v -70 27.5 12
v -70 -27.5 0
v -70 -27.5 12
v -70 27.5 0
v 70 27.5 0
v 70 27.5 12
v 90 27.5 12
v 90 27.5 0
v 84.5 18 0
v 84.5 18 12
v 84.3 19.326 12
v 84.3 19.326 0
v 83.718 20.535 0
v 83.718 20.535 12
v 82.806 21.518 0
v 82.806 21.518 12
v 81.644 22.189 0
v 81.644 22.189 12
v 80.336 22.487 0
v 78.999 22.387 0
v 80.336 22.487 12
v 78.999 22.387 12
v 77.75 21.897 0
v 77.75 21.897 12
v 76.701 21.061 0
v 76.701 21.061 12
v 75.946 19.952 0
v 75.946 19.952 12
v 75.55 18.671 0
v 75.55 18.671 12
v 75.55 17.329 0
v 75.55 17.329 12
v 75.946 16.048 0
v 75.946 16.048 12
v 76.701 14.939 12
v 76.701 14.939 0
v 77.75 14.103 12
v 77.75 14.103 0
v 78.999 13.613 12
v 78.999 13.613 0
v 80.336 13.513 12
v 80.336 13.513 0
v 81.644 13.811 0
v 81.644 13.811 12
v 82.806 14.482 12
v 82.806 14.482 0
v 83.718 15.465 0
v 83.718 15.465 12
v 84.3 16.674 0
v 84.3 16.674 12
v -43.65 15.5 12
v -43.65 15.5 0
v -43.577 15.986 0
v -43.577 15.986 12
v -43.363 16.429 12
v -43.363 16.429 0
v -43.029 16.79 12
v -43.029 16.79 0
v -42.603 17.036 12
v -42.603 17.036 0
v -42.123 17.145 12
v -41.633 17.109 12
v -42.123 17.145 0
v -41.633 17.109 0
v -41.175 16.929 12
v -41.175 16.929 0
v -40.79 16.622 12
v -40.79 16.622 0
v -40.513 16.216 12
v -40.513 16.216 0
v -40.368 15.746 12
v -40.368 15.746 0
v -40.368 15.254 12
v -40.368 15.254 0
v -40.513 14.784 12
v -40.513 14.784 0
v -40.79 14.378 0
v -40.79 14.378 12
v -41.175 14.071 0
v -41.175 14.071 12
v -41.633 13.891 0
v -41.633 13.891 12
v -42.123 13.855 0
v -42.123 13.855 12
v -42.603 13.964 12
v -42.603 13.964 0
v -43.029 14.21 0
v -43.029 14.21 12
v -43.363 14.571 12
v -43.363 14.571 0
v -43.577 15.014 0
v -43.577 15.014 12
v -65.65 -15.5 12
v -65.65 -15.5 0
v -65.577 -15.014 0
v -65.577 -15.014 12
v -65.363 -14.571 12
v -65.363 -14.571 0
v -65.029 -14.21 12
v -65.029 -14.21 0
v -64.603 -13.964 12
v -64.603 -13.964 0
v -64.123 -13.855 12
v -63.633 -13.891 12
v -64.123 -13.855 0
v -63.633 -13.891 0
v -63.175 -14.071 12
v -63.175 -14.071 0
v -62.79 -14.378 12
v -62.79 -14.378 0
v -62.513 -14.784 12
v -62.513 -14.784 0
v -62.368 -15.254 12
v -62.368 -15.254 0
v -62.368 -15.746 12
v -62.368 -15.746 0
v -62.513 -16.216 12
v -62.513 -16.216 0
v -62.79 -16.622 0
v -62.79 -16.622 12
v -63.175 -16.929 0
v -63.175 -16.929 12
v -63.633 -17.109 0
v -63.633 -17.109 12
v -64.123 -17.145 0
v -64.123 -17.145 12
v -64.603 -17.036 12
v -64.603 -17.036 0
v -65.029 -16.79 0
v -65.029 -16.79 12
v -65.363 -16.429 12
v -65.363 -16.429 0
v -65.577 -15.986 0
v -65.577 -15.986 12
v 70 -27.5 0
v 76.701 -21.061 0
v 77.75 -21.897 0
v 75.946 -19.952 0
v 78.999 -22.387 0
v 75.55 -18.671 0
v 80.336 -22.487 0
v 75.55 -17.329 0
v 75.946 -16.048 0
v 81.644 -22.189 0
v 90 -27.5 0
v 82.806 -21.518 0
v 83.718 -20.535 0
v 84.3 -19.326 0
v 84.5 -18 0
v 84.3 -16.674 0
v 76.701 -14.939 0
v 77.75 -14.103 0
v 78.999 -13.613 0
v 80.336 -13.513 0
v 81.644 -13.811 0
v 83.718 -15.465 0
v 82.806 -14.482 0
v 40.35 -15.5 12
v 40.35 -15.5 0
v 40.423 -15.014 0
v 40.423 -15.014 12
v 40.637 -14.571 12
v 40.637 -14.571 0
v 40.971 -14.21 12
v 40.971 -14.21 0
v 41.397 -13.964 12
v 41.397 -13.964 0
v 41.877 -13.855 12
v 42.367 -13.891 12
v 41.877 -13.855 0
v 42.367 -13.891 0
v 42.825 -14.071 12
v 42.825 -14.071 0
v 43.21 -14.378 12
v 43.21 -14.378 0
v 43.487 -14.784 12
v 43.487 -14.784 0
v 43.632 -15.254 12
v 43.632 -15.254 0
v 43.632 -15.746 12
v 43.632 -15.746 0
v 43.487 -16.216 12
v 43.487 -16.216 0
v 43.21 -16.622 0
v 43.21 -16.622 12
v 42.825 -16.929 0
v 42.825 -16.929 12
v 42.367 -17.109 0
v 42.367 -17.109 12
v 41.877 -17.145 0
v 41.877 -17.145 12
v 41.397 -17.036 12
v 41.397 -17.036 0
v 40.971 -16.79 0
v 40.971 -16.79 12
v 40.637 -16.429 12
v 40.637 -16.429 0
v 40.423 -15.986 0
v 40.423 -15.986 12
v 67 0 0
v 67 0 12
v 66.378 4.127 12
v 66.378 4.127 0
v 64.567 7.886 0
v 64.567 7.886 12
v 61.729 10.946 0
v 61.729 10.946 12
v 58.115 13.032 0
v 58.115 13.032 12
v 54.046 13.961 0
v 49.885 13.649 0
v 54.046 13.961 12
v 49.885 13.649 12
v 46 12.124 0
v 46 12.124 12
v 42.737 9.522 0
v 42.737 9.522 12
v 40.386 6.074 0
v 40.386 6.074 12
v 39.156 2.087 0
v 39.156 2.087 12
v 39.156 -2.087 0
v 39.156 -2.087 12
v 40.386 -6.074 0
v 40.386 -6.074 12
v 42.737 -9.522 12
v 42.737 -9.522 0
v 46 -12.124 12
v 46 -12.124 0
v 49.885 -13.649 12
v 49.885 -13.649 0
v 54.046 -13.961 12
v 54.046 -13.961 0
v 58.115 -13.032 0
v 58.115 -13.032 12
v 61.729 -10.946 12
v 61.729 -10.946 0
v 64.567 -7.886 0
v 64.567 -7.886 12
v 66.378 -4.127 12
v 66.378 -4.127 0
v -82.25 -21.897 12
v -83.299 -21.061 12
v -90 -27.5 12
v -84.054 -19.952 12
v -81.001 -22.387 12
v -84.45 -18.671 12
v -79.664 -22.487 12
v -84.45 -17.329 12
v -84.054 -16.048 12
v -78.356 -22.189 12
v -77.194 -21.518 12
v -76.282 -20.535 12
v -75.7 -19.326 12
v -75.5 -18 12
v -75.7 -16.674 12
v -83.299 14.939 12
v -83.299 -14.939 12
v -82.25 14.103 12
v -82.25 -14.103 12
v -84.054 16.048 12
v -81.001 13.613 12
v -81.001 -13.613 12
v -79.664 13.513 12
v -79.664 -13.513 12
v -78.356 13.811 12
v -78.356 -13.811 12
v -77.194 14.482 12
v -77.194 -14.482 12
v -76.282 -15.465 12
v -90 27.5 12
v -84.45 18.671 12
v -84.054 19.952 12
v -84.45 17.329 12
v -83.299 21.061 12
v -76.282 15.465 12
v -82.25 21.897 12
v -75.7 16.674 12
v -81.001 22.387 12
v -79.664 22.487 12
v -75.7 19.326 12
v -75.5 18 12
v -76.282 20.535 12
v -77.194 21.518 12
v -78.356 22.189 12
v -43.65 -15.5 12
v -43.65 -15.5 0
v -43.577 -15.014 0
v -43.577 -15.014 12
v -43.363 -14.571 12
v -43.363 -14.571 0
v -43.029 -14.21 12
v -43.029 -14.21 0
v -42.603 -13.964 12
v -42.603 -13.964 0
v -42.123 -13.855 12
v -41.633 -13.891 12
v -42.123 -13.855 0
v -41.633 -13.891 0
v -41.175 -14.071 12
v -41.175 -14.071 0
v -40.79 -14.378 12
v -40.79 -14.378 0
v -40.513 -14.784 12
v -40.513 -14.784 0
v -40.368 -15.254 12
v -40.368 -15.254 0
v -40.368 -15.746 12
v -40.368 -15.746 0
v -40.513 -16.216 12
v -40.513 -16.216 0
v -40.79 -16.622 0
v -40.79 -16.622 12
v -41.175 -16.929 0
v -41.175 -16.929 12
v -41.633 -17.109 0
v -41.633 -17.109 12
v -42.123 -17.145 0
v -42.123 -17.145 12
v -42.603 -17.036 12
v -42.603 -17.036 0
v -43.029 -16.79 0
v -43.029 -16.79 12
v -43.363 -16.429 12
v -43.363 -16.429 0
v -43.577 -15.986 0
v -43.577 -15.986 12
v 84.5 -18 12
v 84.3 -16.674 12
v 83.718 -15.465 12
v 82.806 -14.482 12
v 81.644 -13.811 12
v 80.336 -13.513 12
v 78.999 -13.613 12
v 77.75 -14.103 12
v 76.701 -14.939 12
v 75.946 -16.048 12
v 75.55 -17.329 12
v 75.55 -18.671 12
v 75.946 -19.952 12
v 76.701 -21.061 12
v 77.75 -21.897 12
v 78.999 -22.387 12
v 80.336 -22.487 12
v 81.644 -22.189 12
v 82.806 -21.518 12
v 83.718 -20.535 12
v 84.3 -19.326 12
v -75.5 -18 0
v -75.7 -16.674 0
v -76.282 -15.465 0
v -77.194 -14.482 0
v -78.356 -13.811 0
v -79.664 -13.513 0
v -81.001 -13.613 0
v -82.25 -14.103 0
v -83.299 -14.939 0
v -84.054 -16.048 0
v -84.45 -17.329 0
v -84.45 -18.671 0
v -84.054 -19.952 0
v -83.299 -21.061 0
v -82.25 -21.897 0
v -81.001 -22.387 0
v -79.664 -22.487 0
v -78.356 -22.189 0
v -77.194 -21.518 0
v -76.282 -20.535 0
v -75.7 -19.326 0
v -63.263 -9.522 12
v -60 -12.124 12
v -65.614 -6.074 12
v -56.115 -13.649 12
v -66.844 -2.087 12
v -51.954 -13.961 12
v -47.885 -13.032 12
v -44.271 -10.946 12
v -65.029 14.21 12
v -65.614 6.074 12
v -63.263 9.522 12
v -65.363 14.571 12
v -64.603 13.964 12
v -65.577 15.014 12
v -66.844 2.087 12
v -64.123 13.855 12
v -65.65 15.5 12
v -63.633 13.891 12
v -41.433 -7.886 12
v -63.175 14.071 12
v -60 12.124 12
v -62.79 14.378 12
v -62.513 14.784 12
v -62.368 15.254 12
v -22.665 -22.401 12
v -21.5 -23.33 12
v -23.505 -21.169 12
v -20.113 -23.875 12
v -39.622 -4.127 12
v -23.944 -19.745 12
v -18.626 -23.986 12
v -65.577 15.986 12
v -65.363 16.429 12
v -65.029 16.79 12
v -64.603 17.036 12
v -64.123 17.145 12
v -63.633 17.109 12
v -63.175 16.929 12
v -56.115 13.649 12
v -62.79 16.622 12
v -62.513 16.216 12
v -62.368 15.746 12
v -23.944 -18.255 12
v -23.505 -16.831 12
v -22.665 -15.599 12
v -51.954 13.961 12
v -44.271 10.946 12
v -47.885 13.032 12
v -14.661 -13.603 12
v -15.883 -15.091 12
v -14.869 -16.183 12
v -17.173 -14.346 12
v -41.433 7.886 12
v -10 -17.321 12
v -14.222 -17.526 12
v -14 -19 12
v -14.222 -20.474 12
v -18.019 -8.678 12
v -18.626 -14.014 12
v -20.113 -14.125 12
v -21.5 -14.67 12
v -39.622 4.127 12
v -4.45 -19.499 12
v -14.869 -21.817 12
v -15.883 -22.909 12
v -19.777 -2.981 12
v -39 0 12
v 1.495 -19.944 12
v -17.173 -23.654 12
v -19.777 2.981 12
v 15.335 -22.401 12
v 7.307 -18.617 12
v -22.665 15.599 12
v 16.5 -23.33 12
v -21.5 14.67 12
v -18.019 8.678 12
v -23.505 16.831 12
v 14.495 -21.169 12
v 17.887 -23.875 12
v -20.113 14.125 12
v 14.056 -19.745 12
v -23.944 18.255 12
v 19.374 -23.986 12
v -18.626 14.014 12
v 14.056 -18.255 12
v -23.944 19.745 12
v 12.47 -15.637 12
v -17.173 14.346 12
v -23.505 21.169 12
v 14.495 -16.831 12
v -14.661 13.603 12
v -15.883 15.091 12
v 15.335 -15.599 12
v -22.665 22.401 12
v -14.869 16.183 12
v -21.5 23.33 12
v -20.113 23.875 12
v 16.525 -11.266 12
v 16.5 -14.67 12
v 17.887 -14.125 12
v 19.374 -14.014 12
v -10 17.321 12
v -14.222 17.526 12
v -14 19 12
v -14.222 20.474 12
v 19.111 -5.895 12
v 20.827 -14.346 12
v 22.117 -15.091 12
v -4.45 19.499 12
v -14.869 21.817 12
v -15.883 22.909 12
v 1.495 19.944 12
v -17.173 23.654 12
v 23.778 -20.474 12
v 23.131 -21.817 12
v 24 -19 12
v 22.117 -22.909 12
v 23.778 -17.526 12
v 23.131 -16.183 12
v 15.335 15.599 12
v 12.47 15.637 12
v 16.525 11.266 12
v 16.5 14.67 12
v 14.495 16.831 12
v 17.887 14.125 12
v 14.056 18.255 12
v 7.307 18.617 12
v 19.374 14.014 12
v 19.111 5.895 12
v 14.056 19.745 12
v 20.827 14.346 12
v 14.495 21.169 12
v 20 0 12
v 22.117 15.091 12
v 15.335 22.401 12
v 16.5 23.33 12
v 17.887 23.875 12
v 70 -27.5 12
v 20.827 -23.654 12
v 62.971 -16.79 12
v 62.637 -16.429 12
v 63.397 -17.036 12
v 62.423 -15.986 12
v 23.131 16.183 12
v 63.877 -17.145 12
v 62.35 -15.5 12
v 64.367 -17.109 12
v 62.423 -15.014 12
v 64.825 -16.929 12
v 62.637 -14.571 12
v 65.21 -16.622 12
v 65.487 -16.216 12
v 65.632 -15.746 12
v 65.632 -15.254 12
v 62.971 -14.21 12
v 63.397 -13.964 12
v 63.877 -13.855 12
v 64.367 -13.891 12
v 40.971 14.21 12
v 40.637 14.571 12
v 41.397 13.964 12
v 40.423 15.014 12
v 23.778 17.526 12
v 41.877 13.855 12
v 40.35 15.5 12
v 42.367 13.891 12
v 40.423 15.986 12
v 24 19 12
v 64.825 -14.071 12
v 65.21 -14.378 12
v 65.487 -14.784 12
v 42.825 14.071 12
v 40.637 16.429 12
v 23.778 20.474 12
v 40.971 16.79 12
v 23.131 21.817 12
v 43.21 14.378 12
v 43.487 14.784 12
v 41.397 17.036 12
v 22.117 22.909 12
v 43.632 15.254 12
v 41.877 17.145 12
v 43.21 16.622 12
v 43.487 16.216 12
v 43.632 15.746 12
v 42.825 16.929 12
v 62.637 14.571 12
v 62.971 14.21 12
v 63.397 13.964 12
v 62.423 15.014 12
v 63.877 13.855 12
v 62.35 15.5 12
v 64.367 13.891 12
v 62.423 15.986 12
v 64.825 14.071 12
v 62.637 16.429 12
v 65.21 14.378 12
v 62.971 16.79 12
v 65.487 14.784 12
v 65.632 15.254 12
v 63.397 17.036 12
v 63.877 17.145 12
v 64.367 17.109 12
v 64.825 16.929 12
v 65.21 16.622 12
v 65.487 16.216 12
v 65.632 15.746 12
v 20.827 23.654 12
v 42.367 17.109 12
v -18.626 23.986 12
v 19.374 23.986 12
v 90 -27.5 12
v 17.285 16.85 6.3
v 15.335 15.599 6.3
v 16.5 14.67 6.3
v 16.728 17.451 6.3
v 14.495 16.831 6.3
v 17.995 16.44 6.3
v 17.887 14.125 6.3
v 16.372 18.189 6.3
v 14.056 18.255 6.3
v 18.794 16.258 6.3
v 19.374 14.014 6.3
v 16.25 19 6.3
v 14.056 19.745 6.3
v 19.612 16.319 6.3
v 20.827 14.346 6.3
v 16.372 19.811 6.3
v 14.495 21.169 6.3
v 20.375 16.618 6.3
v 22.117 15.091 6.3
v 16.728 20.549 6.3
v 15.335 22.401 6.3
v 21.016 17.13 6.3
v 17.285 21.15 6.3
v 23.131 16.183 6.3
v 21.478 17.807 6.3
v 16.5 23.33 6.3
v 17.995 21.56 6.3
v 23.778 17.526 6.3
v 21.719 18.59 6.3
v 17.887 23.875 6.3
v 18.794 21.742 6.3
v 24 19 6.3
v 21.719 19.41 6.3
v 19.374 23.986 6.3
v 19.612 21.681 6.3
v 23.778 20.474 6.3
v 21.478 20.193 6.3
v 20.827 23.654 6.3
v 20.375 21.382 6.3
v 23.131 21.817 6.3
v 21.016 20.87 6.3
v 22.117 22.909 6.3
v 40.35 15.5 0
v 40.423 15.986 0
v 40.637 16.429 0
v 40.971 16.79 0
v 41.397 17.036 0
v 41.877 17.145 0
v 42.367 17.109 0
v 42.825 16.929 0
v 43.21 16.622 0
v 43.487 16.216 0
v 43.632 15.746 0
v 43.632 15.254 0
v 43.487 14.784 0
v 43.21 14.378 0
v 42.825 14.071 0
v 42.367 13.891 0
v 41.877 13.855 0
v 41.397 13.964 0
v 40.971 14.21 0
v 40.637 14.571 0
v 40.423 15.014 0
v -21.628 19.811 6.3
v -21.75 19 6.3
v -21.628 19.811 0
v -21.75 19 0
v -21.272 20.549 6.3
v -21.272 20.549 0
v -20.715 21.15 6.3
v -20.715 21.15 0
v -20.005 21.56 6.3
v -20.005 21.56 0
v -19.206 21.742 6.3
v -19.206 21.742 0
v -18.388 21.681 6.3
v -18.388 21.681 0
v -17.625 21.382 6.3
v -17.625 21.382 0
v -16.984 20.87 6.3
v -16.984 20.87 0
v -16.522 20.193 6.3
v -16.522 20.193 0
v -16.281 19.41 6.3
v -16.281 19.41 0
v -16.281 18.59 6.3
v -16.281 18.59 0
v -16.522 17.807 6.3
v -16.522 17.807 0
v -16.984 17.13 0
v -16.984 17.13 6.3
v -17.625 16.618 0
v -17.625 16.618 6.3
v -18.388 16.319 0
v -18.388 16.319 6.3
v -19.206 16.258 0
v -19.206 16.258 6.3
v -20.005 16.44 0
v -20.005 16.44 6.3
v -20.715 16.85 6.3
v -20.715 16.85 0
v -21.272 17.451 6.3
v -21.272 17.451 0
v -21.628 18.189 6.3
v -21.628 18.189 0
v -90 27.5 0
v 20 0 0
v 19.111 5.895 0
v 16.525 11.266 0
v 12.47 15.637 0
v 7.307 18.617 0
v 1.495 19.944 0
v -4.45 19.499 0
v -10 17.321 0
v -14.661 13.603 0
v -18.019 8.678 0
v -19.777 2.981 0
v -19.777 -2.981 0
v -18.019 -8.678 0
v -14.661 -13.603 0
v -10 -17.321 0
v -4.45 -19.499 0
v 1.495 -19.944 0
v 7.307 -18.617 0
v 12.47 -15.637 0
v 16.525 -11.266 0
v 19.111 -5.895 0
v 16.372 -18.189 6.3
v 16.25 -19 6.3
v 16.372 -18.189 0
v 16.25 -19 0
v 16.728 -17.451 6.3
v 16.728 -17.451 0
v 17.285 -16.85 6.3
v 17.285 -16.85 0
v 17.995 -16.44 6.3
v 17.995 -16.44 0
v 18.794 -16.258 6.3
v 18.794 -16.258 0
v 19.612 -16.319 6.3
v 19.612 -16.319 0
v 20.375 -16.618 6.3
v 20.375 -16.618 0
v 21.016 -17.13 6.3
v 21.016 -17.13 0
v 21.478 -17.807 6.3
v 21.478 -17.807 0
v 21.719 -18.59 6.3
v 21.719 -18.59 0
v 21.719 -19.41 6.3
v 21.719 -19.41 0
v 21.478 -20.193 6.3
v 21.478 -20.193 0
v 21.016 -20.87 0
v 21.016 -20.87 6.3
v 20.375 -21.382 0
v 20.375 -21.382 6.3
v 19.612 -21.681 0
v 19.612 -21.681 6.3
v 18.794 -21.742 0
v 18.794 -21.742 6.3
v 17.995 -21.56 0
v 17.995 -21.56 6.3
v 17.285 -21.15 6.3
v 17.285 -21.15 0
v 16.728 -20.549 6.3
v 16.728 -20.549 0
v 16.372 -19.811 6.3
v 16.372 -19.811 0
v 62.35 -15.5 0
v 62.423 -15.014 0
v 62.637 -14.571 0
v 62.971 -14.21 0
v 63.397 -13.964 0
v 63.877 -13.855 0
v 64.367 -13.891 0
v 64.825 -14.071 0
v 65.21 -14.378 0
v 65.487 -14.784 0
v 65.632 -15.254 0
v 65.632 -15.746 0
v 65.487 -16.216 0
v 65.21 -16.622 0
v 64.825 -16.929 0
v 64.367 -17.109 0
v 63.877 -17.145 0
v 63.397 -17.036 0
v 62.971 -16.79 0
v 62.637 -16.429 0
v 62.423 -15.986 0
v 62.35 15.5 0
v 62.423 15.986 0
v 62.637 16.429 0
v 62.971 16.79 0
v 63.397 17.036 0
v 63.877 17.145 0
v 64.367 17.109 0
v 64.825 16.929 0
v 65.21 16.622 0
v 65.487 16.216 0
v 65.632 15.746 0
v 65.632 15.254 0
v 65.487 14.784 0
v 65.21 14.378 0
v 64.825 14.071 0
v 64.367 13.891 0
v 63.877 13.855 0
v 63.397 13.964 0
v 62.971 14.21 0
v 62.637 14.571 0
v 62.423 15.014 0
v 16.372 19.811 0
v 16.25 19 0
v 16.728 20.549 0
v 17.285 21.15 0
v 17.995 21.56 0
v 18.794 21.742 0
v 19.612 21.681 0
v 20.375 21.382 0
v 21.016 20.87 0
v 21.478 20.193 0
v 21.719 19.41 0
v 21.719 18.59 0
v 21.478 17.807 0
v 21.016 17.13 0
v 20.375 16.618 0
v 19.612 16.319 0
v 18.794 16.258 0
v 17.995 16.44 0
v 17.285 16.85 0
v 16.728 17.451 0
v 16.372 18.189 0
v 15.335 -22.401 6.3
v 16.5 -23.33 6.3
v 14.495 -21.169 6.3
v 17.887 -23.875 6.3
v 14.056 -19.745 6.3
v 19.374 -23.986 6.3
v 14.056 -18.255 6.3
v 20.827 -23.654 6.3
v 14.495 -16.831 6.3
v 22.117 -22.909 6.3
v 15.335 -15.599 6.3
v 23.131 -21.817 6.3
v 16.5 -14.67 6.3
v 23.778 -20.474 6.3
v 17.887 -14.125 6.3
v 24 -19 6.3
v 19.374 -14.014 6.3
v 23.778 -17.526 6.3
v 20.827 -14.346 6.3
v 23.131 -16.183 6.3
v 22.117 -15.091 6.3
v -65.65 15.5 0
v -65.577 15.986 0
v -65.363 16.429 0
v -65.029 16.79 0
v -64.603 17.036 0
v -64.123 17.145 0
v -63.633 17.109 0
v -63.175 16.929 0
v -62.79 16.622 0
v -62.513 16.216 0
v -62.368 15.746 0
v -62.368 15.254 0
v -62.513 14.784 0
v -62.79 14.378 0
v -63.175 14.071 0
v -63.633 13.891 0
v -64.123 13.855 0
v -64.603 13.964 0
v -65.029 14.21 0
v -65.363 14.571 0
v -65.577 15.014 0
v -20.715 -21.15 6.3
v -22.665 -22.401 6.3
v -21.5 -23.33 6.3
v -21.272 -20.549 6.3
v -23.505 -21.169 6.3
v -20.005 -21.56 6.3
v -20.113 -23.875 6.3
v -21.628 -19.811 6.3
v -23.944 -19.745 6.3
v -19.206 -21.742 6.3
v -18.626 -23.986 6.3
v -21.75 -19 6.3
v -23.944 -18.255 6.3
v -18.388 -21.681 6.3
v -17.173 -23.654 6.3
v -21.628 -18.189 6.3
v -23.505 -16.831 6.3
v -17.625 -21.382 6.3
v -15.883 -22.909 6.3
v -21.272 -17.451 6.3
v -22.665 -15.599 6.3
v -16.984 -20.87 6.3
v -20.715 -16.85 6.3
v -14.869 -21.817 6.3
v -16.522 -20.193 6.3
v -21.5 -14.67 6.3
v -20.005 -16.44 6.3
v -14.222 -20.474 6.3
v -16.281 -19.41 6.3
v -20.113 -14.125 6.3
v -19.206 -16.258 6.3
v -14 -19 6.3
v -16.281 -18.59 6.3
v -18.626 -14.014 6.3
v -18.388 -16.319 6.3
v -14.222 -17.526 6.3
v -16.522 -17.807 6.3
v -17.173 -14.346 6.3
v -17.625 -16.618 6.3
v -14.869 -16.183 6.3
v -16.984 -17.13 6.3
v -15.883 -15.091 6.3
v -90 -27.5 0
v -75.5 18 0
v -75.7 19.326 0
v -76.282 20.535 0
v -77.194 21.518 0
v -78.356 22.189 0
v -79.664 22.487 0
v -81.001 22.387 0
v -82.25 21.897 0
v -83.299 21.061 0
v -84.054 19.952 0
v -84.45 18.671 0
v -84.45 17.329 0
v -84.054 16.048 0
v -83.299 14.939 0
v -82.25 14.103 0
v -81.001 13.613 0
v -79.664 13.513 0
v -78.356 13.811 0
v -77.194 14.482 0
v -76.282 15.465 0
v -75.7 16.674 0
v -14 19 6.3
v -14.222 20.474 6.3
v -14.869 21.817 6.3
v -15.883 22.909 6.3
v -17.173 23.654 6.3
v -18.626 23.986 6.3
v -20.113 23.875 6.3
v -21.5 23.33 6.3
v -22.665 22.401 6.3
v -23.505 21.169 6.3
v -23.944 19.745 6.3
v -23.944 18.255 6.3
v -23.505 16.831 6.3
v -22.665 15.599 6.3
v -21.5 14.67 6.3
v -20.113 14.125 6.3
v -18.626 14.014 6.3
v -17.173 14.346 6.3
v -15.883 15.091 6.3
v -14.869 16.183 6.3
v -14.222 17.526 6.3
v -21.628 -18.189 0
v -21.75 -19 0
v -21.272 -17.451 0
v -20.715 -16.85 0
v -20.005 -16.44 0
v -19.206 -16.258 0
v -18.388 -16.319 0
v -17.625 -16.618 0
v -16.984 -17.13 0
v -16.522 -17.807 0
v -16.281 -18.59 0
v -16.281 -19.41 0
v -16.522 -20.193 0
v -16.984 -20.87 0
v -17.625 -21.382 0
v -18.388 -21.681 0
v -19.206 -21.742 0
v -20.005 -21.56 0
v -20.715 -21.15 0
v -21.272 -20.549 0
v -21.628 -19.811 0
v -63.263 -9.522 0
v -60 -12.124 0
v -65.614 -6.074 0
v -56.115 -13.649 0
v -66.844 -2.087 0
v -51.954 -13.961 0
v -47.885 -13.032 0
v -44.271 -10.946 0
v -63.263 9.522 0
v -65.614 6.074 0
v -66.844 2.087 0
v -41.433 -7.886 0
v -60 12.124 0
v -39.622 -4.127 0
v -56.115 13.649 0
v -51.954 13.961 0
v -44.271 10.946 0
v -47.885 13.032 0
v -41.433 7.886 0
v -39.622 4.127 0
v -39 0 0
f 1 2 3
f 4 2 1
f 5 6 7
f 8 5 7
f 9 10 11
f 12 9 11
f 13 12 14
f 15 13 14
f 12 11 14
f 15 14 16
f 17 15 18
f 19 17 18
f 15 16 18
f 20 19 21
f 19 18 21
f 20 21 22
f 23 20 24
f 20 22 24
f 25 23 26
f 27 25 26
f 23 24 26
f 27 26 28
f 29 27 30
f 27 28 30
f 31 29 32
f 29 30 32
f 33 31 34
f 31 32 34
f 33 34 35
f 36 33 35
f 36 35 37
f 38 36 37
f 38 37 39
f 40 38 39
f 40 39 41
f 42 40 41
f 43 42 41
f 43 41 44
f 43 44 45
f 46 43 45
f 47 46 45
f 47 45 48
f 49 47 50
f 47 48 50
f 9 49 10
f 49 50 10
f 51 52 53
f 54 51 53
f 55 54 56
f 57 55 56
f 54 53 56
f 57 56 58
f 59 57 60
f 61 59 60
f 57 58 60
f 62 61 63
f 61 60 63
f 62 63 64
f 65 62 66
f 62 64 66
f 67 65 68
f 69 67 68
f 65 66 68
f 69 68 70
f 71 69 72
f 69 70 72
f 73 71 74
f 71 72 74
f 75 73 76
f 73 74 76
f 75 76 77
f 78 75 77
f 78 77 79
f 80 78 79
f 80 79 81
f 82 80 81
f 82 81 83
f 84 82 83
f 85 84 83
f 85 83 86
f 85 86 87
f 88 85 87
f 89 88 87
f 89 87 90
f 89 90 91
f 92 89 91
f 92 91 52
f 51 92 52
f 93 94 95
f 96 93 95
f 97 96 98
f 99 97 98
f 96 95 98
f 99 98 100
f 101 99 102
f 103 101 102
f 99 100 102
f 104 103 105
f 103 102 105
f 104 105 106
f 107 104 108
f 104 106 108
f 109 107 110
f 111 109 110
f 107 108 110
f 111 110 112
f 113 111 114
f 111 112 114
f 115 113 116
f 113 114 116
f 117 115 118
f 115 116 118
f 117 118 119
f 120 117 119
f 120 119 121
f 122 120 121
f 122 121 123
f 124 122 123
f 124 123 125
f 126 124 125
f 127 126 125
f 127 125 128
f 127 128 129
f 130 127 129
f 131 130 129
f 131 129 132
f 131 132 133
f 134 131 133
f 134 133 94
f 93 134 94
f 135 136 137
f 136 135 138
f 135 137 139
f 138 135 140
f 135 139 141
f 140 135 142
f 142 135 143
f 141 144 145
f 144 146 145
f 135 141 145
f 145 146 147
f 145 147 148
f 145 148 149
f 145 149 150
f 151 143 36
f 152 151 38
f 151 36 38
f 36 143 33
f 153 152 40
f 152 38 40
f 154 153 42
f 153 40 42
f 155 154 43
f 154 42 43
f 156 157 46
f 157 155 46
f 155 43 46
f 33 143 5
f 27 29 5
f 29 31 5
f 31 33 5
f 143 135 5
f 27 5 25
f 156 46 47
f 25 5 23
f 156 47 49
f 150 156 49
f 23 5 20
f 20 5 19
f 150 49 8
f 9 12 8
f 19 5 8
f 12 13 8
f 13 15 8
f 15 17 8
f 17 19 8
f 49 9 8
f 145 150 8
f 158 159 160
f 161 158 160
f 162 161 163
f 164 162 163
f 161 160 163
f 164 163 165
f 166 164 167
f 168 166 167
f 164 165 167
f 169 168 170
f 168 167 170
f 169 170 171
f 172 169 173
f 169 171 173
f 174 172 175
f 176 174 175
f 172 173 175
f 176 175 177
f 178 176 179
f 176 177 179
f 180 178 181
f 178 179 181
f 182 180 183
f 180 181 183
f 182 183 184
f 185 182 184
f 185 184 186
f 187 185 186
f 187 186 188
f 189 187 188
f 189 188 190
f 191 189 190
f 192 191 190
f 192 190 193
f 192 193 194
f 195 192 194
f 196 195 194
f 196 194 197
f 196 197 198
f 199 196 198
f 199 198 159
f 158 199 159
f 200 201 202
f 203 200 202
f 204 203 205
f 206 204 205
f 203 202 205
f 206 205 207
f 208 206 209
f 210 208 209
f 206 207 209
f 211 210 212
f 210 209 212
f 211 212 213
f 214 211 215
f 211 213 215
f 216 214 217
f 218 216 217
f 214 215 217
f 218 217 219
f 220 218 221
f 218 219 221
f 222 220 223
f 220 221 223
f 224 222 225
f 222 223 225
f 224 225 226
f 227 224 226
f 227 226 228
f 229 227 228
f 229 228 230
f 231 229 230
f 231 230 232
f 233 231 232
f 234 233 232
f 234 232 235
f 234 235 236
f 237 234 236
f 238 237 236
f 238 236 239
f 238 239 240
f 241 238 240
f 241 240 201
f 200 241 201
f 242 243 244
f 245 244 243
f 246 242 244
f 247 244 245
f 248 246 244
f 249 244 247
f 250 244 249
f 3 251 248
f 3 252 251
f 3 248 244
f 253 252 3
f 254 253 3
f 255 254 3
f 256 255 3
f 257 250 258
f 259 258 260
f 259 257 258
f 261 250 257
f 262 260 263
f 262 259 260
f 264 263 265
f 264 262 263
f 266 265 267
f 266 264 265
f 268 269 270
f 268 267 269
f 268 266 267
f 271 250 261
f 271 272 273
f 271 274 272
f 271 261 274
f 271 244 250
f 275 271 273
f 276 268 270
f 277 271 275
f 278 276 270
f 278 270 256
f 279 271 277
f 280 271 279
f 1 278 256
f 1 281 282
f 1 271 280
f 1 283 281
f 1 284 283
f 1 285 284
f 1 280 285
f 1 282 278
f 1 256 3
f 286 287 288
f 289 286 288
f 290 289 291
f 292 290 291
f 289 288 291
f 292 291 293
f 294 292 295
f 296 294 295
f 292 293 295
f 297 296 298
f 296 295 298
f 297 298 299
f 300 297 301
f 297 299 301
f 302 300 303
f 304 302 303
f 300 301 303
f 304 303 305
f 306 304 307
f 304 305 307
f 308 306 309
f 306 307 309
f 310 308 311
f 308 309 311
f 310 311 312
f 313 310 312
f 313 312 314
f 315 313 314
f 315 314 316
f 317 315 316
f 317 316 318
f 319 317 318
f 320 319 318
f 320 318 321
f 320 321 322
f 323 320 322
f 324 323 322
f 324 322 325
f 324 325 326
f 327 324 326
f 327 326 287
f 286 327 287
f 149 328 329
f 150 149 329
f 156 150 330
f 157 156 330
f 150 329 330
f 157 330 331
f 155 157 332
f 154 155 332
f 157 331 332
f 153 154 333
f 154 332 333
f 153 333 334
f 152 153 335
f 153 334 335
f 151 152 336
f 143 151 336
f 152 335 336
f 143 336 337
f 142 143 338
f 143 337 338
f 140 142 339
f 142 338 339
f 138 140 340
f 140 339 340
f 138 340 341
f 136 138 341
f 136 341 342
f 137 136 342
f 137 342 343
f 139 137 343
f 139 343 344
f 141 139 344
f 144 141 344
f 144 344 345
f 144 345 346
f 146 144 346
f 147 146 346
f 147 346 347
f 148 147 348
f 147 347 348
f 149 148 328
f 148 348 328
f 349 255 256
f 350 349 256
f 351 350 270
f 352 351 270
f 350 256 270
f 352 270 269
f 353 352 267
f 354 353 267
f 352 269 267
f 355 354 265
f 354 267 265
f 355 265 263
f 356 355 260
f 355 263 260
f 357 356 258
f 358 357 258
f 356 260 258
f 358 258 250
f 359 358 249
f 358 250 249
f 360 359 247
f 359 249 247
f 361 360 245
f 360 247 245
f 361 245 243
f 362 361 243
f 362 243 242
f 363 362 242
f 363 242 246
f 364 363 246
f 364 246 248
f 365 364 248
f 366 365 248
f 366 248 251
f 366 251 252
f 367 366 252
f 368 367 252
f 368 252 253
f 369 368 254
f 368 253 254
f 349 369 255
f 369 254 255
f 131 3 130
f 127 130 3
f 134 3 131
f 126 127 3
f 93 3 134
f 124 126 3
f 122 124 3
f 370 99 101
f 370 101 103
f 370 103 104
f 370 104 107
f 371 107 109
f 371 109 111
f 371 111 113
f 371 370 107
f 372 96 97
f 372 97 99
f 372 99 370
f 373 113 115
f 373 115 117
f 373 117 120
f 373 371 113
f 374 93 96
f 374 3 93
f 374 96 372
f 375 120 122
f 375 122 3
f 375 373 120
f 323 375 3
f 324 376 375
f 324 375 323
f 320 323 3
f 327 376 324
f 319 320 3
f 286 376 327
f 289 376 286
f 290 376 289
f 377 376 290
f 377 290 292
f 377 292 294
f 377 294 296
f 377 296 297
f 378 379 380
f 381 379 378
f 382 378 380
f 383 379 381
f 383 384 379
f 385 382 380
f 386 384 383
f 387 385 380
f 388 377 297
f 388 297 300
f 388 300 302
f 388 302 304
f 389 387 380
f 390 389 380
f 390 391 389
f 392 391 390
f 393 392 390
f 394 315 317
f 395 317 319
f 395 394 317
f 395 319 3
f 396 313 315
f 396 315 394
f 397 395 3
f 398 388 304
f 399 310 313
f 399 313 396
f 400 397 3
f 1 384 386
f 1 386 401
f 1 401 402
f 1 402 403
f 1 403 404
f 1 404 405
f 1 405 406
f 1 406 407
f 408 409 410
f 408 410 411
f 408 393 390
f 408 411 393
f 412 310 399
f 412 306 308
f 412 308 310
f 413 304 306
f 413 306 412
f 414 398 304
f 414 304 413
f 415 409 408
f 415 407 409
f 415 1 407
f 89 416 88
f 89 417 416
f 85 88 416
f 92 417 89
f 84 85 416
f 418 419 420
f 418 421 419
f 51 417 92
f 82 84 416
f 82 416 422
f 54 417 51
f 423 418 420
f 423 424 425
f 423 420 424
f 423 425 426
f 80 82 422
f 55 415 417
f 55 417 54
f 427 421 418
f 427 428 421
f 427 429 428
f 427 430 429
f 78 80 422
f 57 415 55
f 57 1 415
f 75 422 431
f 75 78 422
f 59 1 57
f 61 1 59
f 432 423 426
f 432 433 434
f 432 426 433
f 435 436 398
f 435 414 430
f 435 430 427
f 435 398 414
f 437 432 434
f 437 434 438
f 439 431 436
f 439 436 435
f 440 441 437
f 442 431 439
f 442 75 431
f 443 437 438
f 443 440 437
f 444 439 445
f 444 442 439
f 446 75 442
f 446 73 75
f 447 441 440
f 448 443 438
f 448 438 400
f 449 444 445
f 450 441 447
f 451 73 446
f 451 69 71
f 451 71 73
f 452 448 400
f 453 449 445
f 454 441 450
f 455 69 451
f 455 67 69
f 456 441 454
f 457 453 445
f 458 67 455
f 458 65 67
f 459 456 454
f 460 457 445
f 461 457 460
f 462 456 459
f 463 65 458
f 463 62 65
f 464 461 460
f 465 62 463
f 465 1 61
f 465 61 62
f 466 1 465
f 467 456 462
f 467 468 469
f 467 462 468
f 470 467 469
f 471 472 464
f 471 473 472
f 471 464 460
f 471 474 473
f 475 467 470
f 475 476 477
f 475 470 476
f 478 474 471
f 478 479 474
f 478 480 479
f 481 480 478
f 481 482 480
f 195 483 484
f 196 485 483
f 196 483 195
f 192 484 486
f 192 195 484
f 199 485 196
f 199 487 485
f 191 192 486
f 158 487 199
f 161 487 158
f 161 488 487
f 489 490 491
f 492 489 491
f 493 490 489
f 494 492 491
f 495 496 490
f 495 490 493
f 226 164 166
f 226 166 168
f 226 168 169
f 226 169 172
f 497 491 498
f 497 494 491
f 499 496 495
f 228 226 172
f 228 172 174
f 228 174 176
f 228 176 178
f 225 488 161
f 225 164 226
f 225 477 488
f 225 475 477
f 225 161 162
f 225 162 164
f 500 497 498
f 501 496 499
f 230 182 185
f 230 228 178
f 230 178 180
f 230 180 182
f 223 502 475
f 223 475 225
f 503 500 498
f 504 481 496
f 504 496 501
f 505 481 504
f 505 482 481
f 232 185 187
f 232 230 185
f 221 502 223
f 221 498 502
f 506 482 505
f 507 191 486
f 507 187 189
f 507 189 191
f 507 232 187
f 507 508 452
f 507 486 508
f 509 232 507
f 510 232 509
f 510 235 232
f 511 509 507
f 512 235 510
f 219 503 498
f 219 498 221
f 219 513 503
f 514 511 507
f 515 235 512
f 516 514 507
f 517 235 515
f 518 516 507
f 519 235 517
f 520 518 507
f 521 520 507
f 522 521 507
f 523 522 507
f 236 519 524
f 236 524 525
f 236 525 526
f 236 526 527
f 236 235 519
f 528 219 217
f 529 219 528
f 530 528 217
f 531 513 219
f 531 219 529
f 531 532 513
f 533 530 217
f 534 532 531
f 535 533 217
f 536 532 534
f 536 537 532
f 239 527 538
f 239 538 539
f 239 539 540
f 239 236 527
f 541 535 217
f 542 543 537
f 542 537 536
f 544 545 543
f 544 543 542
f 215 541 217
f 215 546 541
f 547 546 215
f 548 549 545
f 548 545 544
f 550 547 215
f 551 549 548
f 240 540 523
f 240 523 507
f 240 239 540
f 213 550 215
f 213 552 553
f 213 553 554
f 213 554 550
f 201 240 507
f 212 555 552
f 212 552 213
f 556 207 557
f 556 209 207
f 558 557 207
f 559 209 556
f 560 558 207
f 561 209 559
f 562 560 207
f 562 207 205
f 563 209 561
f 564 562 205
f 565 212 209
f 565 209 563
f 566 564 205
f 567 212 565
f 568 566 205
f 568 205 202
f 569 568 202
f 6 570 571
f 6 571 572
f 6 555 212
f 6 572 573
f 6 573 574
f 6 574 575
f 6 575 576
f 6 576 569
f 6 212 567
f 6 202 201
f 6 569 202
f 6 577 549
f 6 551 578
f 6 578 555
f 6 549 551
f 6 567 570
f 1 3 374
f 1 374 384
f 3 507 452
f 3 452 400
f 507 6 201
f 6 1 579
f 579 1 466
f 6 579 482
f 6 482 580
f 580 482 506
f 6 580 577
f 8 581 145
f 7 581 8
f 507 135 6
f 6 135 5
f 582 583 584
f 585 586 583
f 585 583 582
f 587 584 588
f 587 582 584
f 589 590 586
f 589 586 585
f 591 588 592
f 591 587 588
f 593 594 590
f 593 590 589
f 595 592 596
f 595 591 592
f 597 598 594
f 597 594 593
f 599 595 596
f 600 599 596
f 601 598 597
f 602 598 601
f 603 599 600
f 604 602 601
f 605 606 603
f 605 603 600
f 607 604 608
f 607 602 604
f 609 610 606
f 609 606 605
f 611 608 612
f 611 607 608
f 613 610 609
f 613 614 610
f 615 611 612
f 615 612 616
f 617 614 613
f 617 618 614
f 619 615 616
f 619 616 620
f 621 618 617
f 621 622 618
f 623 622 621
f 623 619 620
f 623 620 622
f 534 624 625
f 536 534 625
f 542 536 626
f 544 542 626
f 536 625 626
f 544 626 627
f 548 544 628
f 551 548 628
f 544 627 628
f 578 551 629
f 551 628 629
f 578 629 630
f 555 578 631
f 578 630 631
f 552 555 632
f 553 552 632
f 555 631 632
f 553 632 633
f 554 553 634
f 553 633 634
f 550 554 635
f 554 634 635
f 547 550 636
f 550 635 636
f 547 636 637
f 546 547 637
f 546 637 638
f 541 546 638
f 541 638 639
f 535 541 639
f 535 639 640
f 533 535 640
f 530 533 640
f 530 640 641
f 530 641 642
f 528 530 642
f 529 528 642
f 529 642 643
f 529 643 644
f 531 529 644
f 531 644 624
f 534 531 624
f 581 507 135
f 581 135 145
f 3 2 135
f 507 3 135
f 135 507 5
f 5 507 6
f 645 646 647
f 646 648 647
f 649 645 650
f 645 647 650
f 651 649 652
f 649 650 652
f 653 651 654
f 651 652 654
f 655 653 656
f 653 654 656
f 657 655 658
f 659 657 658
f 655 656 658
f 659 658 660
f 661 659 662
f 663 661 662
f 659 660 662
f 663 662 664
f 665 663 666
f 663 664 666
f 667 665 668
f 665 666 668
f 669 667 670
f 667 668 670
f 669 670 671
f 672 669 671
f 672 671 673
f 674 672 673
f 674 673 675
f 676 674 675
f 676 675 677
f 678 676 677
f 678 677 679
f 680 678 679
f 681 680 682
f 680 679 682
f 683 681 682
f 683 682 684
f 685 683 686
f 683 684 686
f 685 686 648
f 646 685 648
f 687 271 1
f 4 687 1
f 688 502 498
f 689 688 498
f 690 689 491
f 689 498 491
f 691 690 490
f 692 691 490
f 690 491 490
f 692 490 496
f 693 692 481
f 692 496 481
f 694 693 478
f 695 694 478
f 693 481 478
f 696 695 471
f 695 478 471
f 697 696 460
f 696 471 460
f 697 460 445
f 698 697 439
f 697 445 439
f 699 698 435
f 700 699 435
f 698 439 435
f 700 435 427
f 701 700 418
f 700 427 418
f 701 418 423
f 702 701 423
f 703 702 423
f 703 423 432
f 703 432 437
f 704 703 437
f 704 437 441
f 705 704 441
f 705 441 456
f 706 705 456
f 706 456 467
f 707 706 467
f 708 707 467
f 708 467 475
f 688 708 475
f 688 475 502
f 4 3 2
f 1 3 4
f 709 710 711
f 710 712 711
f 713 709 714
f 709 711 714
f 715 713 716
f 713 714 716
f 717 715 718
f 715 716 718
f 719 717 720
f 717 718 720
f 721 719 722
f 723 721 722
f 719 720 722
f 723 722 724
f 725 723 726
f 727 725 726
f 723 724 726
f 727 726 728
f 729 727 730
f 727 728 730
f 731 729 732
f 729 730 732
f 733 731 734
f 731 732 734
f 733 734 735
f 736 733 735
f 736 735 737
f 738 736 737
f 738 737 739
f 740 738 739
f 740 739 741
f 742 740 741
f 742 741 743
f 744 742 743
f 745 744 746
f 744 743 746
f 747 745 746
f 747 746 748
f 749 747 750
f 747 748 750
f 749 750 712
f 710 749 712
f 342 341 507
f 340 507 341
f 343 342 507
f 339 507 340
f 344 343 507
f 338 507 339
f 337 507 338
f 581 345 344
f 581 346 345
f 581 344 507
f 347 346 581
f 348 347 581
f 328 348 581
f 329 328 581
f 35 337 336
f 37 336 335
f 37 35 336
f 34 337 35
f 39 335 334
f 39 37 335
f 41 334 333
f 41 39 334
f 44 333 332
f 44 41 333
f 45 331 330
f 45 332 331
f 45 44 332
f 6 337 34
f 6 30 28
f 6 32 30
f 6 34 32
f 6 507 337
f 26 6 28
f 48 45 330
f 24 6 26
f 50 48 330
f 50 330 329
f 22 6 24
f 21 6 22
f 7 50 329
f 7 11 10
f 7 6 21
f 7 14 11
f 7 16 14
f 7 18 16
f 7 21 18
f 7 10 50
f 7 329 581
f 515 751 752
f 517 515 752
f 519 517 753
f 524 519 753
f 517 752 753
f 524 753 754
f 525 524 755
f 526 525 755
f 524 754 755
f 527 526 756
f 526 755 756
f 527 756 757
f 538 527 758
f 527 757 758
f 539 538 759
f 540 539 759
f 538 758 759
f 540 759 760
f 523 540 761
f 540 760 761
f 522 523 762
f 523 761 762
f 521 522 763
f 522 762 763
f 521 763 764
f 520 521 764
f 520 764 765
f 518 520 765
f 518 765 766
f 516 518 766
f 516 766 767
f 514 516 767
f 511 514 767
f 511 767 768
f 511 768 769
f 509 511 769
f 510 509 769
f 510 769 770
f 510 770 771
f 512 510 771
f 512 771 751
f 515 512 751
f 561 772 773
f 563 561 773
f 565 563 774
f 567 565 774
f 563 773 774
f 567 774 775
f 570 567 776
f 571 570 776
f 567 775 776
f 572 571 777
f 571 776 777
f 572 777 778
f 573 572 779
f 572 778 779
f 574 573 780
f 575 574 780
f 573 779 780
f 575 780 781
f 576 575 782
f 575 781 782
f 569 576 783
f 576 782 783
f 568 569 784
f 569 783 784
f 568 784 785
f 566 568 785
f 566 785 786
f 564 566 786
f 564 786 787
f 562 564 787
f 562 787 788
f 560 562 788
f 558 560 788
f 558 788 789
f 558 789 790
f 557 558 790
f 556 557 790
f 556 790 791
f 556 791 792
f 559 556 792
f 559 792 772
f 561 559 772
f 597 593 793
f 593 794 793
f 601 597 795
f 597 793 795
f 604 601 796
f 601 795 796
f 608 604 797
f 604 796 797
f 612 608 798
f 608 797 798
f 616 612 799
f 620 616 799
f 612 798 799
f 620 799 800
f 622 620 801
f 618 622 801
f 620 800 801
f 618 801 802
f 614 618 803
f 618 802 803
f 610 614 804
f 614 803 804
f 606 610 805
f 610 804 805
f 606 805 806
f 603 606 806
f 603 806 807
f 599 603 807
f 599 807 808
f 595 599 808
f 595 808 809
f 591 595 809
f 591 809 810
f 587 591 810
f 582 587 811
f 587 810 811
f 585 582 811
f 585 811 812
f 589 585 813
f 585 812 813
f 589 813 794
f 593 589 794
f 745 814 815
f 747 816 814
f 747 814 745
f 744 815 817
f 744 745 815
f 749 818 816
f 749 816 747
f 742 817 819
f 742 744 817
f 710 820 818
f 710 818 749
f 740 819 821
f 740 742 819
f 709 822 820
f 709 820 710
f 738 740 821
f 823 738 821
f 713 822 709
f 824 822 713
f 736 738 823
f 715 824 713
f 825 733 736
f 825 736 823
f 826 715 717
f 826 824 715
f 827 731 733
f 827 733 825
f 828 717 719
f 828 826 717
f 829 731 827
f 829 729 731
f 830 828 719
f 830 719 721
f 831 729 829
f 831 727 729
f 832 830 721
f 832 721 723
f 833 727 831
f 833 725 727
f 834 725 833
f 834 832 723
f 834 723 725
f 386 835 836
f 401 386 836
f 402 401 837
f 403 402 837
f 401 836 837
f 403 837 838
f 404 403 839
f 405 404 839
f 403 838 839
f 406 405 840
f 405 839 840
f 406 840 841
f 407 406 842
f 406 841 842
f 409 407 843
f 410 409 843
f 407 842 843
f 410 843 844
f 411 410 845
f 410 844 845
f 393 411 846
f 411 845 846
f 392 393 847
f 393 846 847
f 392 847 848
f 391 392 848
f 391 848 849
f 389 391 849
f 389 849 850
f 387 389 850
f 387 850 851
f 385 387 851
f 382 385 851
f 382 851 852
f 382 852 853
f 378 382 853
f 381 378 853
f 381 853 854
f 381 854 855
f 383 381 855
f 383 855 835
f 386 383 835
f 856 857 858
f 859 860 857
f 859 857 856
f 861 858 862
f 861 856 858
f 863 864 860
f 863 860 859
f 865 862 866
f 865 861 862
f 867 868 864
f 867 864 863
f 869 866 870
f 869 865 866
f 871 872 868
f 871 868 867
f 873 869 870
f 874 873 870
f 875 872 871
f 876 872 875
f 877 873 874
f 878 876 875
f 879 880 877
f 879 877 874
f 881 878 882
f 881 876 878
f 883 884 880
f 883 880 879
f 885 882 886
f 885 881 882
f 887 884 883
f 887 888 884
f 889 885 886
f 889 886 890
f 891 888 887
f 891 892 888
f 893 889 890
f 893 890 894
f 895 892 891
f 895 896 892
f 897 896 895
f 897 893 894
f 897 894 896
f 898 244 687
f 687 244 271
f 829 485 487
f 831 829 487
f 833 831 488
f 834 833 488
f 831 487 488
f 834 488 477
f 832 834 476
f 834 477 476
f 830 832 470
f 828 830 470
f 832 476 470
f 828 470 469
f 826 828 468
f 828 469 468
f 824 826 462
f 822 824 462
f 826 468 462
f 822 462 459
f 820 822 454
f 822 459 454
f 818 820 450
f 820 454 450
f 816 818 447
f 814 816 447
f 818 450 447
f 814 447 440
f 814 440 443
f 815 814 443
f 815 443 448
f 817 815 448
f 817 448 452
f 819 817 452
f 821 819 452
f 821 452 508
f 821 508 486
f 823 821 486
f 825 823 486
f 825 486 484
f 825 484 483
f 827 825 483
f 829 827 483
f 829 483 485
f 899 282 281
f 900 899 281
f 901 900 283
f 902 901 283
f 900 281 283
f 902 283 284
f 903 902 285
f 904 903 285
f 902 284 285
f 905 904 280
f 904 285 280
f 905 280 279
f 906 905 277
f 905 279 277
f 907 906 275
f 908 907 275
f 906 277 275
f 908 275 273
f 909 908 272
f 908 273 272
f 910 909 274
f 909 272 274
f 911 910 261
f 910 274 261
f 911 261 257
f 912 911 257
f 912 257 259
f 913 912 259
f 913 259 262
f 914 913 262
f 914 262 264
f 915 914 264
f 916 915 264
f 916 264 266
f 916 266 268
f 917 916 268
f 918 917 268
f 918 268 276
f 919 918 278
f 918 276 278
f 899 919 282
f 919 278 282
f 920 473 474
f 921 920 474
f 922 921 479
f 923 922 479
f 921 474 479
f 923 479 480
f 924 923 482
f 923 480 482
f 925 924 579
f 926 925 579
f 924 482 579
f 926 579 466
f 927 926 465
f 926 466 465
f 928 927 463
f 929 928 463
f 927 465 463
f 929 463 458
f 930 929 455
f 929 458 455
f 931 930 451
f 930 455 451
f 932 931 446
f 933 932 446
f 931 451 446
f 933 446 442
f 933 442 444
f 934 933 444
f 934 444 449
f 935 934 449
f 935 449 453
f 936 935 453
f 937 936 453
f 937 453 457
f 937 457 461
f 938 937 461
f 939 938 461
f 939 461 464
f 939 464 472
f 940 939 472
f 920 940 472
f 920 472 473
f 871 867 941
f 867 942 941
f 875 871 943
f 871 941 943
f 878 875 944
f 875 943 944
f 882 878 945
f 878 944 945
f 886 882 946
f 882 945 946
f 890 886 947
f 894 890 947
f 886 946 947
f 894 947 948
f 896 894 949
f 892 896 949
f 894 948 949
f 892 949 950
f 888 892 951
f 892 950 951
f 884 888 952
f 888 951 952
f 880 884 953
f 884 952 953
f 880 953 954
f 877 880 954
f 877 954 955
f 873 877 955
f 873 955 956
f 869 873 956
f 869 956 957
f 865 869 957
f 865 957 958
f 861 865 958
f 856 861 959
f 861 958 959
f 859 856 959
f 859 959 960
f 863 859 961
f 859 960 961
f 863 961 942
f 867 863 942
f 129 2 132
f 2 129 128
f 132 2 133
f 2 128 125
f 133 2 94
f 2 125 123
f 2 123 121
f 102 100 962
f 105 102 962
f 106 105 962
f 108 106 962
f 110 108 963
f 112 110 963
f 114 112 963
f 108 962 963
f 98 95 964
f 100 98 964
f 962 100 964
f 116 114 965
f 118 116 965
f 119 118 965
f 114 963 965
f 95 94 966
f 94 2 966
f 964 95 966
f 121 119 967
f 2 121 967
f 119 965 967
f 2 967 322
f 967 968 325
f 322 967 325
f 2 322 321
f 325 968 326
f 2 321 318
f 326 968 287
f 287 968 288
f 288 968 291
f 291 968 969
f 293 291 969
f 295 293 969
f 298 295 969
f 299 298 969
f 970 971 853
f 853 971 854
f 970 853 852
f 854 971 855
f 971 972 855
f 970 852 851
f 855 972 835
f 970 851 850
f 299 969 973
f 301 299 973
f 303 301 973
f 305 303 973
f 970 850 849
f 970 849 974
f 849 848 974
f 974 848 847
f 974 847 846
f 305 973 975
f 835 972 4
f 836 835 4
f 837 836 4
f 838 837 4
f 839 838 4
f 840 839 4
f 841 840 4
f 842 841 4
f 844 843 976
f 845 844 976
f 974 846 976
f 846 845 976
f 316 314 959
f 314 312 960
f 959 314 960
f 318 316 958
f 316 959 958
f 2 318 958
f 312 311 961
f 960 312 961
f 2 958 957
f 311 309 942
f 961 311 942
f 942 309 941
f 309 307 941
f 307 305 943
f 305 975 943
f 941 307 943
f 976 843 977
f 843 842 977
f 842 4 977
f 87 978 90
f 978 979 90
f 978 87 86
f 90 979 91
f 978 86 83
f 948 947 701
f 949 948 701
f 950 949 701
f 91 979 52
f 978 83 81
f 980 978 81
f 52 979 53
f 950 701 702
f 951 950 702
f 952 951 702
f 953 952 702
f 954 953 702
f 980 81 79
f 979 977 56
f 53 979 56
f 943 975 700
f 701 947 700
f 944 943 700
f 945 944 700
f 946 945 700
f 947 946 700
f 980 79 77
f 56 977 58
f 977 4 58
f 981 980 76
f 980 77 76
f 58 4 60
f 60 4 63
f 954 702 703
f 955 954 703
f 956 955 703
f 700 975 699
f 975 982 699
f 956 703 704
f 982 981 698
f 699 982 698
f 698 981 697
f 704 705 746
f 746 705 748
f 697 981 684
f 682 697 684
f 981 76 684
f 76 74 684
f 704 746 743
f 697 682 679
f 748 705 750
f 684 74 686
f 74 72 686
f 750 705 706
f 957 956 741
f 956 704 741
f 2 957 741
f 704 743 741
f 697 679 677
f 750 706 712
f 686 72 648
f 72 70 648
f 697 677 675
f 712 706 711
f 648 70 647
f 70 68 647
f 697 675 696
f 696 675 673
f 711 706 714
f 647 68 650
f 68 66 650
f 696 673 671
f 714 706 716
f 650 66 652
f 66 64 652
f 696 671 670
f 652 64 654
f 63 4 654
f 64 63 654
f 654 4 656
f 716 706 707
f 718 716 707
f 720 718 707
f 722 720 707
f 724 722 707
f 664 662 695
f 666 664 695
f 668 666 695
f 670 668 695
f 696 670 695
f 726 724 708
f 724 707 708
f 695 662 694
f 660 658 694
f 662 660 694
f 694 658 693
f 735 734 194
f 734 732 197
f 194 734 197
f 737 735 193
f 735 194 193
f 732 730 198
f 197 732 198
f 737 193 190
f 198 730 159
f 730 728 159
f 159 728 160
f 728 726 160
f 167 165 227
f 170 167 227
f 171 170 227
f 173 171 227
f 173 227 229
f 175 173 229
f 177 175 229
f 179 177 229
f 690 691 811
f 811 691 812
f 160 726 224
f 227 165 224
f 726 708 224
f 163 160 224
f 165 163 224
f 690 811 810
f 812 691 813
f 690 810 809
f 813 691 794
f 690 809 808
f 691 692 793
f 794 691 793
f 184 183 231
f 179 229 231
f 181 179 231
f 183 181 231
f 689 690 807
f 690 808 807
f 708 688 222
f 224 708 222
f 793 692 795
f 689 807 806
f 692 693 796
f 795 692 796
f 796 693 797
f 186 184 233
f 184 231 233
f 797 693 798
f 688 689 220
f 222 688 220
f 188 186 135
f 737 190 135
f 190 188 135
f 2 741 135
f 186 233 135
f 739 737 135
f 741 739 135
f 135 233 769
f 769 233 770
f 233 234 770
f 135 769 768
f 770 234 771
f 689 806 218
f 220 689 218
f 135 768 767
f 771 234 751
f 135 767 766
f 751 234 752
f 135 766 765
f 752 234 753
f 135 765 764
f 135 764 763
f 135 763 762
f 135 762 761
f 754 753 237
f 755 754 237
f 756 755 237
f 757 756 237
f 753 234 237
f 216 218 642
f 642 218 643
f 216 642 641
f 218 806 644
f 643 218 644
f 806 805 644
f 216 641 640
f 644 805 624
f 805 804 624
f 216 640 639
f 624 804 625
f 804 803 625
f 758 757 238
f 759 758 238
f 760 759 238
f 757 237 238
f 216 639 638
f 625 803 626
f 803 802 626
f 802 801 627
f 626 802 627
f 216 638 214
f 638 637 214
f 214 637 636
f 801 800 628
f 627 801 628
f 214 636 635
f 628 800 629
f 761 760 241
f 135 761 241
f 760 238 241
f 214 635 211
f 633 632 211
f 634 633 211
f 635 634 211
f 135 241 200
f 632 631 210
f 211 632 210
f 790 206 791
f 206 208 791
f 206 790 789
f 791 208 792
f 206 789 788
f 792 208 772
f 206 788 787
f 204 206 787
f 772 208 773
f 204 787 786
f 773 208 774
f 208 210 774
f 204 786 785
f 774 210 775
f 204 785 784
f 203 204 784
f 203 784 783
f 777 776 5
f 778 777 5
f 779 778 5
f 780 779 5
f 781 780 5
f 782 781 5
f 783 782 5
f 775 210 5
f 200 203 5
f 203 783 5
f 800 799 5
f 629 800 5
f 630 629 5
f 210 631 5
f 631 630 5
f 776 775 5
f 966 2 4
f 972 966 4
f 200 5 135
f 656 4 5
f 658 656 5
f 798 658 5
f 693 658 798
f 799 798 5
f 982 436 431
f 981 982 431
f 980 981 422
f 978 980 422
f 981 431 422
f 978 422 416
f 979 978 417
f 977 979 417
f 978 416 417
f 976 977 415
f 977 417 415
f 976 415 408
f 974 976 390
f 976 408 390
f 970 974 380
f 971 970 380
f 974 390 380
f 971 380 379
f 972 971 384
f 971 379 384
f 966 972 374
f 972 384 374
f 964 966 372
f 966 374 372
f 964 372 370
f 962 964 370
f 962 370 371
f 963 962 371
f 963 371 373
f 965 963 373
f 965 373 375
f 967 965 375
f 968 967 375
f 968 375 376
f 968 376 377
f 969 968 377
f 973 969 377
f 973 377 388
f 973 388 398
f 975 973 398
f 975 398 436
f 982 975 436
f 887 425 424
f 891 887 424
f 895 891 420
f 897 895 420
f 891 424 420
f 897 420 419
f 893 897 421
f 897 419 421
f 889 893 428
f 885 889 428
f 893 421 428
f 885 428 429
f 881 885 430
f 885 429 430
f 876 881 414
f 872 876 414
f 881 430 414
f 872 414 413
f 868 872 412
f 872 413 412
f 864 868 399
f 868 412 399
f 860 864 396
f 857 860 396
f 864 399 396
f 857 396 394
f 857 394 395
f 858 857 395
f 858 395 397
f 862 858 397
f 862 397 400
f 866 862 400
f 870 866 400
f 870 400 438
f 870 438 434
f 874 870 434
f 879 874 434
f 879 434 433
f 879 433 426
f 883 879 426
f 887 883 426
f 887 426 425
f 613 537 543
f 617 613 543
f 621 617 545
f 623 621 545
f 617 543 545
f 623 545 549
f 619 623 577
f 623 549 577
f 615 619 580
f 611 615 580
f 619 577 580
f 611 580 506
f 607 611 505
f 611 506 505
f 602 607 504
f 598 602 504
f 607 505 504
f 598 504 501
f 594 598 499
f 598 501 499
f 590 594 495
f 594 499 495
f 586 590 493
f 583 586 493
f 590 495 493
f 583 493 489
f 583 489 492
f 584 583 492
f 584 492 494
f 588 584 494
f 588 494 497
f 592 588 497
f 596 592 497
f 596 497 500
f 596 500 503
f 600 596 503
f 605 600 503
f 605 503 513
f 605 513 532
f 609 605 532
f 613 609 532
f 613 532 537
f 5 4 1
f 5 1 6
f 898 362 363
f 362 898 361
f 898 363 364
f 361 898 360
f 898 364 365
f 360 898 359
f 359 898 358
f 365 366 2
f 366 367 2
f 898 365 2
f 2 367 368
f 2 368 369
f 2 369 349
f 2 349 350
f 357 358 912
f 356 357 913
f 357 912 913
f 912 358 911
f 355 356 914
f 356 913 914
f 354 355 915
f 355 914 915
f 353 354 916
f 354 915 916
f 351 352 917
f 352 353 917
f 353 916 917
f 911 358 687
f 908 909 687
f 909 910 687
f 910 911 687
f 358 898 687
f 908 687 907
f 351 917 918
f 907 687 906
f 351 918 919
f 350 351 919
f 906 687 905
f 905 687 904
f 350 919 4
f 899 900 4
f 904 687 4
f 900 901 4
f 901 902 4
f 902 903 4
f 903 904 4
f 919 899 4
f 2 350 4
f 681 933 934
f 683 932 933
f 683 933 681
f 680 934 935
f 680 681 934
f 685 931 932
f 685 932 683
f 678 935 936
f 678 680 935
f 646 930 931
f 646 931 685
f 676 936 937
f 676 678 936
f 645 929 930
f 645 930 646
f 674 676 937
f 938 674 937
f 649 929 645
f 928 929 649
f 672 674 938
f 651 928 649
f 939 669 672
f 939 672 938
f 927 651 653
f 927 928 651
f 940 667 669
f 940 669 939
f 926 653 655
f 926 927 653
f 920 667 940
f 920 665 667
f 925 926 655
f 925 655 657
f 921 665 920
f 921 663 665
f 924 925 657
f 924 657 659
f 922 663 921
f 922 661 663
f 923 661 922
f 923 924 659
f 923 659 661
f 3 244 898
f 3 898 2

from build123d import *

# Parameters (mm, degrees)
SKETCH_1_W                = 140
SKETCH_1_H                = 55
EXTRUDE_1_DEPTH           = 12
SKETCH_2_R                = 20
SKETCH_2_R_2              = 14
CUT_EXTRUDE_1_DEPTH       = 77.159372371
HOLE_WIZARD_M4_1_D        = 3.3
HOLE_WIZARD_1_D           = 5.5
HOLE_WIZARD_1_CBORE_D     = 10
HOLE_WIZARD_1_CBORE_DEPTH = 5.7
SKETCH_10_W               = 20
SKETCH_10_H               = 55
SKETCH_10_R               = 4.5
EXTRUDE_2_DEPTH           = 12
EXTRUDE_2_2_DEPTH         = 12


with BuildPart() as part:
    # 草图1 → 凸台-拉伸1 (new body)
    with BuildSketch(Plane.XY):
        Rectangle(SKETCH_1_W, SKETCH_1_H)
    extrude(amount=EXTRUDE_1_DEPTH)

    # 草图2 → 切除-拉伸1 (cut, through all)
    with BuildSketch(Plane.XY.offset(12)):
        Circle(SKETCH_2_R)
        with Locations((-53, 0)):
            Circle(SKETCH_2_R_2)
        with Locations((53, 0)):
            Circle(SKETCH_2_R_2)
    extrude(amount=-CUT_EXTRUDE_1_DEPTH, mode=Mode.SUBTRACT)

    # M4 螺纹孔1 (through all)
    with Locations(Plane.XY.offset(12)):
        with Locations((-64, 15.5), (-42, 15.5), (-42, -15.5), (-64, -15.5), (42, -15.5), (64, -15.5), (64, 15.5), (42, 15.5)):
            Hole(HOLE_WIZARD_M4_1_D / 2)

    # 打孔尺寸(%根据)内六角圆柱头螺钉的类型1 (through all)
    with Locations(Plane.XY.offset(12)):
        with Locations((-19, 19), (19, 19), (19, -19), (-19, -19)):
            CounterBoreHole(HOLE_WIZARD_1_D / 2, HOLE_WIZARD_1_CBORE_D / 2, HOLE_WIZARD_1_CBORE_DEPTH)


with BuildPart() as body_2:
    # 草图10 → 凸台-拉伸2 (new body)
    with BuildSketch(Plane.XY.offset(12)):
        with Locations((80, 0)):
            Rectangle(SKETCH_10_W, SKETCH_10_H)
        with Locations((80, -18)):
            Circle(SKETCH_10_R, mode=Mode.SUBTRACT)
        with Locations((80, 18)):
            Circle(SKETCH_10_R, mode=Mode.SUBTRACT)
    extrude(amount=-EXTRUDE_2_DEPTH)


with BuildPart() as body_3:
    # 草图10 → Extrude 2 2 (new body)
    with BuildSketch(Plane.XY.offset(12)):
        with Locations((-80, 0)):
            Rectangle(SKETCH_10_W, SKETCH_10_H)
        with Locations((-80, 18)):
            Circle(SKETCH_10_R, mode=Mode.SUBTRACT)
        with Locations((-80, -18)):
            Circle(SKETCH_10_R, mode=Mode.SUBTRACT)
    extrude(amount=-EXTRUDE_2_2_DEPTH)


solid = Compound([part.part, body_2.part, body_3.part])
